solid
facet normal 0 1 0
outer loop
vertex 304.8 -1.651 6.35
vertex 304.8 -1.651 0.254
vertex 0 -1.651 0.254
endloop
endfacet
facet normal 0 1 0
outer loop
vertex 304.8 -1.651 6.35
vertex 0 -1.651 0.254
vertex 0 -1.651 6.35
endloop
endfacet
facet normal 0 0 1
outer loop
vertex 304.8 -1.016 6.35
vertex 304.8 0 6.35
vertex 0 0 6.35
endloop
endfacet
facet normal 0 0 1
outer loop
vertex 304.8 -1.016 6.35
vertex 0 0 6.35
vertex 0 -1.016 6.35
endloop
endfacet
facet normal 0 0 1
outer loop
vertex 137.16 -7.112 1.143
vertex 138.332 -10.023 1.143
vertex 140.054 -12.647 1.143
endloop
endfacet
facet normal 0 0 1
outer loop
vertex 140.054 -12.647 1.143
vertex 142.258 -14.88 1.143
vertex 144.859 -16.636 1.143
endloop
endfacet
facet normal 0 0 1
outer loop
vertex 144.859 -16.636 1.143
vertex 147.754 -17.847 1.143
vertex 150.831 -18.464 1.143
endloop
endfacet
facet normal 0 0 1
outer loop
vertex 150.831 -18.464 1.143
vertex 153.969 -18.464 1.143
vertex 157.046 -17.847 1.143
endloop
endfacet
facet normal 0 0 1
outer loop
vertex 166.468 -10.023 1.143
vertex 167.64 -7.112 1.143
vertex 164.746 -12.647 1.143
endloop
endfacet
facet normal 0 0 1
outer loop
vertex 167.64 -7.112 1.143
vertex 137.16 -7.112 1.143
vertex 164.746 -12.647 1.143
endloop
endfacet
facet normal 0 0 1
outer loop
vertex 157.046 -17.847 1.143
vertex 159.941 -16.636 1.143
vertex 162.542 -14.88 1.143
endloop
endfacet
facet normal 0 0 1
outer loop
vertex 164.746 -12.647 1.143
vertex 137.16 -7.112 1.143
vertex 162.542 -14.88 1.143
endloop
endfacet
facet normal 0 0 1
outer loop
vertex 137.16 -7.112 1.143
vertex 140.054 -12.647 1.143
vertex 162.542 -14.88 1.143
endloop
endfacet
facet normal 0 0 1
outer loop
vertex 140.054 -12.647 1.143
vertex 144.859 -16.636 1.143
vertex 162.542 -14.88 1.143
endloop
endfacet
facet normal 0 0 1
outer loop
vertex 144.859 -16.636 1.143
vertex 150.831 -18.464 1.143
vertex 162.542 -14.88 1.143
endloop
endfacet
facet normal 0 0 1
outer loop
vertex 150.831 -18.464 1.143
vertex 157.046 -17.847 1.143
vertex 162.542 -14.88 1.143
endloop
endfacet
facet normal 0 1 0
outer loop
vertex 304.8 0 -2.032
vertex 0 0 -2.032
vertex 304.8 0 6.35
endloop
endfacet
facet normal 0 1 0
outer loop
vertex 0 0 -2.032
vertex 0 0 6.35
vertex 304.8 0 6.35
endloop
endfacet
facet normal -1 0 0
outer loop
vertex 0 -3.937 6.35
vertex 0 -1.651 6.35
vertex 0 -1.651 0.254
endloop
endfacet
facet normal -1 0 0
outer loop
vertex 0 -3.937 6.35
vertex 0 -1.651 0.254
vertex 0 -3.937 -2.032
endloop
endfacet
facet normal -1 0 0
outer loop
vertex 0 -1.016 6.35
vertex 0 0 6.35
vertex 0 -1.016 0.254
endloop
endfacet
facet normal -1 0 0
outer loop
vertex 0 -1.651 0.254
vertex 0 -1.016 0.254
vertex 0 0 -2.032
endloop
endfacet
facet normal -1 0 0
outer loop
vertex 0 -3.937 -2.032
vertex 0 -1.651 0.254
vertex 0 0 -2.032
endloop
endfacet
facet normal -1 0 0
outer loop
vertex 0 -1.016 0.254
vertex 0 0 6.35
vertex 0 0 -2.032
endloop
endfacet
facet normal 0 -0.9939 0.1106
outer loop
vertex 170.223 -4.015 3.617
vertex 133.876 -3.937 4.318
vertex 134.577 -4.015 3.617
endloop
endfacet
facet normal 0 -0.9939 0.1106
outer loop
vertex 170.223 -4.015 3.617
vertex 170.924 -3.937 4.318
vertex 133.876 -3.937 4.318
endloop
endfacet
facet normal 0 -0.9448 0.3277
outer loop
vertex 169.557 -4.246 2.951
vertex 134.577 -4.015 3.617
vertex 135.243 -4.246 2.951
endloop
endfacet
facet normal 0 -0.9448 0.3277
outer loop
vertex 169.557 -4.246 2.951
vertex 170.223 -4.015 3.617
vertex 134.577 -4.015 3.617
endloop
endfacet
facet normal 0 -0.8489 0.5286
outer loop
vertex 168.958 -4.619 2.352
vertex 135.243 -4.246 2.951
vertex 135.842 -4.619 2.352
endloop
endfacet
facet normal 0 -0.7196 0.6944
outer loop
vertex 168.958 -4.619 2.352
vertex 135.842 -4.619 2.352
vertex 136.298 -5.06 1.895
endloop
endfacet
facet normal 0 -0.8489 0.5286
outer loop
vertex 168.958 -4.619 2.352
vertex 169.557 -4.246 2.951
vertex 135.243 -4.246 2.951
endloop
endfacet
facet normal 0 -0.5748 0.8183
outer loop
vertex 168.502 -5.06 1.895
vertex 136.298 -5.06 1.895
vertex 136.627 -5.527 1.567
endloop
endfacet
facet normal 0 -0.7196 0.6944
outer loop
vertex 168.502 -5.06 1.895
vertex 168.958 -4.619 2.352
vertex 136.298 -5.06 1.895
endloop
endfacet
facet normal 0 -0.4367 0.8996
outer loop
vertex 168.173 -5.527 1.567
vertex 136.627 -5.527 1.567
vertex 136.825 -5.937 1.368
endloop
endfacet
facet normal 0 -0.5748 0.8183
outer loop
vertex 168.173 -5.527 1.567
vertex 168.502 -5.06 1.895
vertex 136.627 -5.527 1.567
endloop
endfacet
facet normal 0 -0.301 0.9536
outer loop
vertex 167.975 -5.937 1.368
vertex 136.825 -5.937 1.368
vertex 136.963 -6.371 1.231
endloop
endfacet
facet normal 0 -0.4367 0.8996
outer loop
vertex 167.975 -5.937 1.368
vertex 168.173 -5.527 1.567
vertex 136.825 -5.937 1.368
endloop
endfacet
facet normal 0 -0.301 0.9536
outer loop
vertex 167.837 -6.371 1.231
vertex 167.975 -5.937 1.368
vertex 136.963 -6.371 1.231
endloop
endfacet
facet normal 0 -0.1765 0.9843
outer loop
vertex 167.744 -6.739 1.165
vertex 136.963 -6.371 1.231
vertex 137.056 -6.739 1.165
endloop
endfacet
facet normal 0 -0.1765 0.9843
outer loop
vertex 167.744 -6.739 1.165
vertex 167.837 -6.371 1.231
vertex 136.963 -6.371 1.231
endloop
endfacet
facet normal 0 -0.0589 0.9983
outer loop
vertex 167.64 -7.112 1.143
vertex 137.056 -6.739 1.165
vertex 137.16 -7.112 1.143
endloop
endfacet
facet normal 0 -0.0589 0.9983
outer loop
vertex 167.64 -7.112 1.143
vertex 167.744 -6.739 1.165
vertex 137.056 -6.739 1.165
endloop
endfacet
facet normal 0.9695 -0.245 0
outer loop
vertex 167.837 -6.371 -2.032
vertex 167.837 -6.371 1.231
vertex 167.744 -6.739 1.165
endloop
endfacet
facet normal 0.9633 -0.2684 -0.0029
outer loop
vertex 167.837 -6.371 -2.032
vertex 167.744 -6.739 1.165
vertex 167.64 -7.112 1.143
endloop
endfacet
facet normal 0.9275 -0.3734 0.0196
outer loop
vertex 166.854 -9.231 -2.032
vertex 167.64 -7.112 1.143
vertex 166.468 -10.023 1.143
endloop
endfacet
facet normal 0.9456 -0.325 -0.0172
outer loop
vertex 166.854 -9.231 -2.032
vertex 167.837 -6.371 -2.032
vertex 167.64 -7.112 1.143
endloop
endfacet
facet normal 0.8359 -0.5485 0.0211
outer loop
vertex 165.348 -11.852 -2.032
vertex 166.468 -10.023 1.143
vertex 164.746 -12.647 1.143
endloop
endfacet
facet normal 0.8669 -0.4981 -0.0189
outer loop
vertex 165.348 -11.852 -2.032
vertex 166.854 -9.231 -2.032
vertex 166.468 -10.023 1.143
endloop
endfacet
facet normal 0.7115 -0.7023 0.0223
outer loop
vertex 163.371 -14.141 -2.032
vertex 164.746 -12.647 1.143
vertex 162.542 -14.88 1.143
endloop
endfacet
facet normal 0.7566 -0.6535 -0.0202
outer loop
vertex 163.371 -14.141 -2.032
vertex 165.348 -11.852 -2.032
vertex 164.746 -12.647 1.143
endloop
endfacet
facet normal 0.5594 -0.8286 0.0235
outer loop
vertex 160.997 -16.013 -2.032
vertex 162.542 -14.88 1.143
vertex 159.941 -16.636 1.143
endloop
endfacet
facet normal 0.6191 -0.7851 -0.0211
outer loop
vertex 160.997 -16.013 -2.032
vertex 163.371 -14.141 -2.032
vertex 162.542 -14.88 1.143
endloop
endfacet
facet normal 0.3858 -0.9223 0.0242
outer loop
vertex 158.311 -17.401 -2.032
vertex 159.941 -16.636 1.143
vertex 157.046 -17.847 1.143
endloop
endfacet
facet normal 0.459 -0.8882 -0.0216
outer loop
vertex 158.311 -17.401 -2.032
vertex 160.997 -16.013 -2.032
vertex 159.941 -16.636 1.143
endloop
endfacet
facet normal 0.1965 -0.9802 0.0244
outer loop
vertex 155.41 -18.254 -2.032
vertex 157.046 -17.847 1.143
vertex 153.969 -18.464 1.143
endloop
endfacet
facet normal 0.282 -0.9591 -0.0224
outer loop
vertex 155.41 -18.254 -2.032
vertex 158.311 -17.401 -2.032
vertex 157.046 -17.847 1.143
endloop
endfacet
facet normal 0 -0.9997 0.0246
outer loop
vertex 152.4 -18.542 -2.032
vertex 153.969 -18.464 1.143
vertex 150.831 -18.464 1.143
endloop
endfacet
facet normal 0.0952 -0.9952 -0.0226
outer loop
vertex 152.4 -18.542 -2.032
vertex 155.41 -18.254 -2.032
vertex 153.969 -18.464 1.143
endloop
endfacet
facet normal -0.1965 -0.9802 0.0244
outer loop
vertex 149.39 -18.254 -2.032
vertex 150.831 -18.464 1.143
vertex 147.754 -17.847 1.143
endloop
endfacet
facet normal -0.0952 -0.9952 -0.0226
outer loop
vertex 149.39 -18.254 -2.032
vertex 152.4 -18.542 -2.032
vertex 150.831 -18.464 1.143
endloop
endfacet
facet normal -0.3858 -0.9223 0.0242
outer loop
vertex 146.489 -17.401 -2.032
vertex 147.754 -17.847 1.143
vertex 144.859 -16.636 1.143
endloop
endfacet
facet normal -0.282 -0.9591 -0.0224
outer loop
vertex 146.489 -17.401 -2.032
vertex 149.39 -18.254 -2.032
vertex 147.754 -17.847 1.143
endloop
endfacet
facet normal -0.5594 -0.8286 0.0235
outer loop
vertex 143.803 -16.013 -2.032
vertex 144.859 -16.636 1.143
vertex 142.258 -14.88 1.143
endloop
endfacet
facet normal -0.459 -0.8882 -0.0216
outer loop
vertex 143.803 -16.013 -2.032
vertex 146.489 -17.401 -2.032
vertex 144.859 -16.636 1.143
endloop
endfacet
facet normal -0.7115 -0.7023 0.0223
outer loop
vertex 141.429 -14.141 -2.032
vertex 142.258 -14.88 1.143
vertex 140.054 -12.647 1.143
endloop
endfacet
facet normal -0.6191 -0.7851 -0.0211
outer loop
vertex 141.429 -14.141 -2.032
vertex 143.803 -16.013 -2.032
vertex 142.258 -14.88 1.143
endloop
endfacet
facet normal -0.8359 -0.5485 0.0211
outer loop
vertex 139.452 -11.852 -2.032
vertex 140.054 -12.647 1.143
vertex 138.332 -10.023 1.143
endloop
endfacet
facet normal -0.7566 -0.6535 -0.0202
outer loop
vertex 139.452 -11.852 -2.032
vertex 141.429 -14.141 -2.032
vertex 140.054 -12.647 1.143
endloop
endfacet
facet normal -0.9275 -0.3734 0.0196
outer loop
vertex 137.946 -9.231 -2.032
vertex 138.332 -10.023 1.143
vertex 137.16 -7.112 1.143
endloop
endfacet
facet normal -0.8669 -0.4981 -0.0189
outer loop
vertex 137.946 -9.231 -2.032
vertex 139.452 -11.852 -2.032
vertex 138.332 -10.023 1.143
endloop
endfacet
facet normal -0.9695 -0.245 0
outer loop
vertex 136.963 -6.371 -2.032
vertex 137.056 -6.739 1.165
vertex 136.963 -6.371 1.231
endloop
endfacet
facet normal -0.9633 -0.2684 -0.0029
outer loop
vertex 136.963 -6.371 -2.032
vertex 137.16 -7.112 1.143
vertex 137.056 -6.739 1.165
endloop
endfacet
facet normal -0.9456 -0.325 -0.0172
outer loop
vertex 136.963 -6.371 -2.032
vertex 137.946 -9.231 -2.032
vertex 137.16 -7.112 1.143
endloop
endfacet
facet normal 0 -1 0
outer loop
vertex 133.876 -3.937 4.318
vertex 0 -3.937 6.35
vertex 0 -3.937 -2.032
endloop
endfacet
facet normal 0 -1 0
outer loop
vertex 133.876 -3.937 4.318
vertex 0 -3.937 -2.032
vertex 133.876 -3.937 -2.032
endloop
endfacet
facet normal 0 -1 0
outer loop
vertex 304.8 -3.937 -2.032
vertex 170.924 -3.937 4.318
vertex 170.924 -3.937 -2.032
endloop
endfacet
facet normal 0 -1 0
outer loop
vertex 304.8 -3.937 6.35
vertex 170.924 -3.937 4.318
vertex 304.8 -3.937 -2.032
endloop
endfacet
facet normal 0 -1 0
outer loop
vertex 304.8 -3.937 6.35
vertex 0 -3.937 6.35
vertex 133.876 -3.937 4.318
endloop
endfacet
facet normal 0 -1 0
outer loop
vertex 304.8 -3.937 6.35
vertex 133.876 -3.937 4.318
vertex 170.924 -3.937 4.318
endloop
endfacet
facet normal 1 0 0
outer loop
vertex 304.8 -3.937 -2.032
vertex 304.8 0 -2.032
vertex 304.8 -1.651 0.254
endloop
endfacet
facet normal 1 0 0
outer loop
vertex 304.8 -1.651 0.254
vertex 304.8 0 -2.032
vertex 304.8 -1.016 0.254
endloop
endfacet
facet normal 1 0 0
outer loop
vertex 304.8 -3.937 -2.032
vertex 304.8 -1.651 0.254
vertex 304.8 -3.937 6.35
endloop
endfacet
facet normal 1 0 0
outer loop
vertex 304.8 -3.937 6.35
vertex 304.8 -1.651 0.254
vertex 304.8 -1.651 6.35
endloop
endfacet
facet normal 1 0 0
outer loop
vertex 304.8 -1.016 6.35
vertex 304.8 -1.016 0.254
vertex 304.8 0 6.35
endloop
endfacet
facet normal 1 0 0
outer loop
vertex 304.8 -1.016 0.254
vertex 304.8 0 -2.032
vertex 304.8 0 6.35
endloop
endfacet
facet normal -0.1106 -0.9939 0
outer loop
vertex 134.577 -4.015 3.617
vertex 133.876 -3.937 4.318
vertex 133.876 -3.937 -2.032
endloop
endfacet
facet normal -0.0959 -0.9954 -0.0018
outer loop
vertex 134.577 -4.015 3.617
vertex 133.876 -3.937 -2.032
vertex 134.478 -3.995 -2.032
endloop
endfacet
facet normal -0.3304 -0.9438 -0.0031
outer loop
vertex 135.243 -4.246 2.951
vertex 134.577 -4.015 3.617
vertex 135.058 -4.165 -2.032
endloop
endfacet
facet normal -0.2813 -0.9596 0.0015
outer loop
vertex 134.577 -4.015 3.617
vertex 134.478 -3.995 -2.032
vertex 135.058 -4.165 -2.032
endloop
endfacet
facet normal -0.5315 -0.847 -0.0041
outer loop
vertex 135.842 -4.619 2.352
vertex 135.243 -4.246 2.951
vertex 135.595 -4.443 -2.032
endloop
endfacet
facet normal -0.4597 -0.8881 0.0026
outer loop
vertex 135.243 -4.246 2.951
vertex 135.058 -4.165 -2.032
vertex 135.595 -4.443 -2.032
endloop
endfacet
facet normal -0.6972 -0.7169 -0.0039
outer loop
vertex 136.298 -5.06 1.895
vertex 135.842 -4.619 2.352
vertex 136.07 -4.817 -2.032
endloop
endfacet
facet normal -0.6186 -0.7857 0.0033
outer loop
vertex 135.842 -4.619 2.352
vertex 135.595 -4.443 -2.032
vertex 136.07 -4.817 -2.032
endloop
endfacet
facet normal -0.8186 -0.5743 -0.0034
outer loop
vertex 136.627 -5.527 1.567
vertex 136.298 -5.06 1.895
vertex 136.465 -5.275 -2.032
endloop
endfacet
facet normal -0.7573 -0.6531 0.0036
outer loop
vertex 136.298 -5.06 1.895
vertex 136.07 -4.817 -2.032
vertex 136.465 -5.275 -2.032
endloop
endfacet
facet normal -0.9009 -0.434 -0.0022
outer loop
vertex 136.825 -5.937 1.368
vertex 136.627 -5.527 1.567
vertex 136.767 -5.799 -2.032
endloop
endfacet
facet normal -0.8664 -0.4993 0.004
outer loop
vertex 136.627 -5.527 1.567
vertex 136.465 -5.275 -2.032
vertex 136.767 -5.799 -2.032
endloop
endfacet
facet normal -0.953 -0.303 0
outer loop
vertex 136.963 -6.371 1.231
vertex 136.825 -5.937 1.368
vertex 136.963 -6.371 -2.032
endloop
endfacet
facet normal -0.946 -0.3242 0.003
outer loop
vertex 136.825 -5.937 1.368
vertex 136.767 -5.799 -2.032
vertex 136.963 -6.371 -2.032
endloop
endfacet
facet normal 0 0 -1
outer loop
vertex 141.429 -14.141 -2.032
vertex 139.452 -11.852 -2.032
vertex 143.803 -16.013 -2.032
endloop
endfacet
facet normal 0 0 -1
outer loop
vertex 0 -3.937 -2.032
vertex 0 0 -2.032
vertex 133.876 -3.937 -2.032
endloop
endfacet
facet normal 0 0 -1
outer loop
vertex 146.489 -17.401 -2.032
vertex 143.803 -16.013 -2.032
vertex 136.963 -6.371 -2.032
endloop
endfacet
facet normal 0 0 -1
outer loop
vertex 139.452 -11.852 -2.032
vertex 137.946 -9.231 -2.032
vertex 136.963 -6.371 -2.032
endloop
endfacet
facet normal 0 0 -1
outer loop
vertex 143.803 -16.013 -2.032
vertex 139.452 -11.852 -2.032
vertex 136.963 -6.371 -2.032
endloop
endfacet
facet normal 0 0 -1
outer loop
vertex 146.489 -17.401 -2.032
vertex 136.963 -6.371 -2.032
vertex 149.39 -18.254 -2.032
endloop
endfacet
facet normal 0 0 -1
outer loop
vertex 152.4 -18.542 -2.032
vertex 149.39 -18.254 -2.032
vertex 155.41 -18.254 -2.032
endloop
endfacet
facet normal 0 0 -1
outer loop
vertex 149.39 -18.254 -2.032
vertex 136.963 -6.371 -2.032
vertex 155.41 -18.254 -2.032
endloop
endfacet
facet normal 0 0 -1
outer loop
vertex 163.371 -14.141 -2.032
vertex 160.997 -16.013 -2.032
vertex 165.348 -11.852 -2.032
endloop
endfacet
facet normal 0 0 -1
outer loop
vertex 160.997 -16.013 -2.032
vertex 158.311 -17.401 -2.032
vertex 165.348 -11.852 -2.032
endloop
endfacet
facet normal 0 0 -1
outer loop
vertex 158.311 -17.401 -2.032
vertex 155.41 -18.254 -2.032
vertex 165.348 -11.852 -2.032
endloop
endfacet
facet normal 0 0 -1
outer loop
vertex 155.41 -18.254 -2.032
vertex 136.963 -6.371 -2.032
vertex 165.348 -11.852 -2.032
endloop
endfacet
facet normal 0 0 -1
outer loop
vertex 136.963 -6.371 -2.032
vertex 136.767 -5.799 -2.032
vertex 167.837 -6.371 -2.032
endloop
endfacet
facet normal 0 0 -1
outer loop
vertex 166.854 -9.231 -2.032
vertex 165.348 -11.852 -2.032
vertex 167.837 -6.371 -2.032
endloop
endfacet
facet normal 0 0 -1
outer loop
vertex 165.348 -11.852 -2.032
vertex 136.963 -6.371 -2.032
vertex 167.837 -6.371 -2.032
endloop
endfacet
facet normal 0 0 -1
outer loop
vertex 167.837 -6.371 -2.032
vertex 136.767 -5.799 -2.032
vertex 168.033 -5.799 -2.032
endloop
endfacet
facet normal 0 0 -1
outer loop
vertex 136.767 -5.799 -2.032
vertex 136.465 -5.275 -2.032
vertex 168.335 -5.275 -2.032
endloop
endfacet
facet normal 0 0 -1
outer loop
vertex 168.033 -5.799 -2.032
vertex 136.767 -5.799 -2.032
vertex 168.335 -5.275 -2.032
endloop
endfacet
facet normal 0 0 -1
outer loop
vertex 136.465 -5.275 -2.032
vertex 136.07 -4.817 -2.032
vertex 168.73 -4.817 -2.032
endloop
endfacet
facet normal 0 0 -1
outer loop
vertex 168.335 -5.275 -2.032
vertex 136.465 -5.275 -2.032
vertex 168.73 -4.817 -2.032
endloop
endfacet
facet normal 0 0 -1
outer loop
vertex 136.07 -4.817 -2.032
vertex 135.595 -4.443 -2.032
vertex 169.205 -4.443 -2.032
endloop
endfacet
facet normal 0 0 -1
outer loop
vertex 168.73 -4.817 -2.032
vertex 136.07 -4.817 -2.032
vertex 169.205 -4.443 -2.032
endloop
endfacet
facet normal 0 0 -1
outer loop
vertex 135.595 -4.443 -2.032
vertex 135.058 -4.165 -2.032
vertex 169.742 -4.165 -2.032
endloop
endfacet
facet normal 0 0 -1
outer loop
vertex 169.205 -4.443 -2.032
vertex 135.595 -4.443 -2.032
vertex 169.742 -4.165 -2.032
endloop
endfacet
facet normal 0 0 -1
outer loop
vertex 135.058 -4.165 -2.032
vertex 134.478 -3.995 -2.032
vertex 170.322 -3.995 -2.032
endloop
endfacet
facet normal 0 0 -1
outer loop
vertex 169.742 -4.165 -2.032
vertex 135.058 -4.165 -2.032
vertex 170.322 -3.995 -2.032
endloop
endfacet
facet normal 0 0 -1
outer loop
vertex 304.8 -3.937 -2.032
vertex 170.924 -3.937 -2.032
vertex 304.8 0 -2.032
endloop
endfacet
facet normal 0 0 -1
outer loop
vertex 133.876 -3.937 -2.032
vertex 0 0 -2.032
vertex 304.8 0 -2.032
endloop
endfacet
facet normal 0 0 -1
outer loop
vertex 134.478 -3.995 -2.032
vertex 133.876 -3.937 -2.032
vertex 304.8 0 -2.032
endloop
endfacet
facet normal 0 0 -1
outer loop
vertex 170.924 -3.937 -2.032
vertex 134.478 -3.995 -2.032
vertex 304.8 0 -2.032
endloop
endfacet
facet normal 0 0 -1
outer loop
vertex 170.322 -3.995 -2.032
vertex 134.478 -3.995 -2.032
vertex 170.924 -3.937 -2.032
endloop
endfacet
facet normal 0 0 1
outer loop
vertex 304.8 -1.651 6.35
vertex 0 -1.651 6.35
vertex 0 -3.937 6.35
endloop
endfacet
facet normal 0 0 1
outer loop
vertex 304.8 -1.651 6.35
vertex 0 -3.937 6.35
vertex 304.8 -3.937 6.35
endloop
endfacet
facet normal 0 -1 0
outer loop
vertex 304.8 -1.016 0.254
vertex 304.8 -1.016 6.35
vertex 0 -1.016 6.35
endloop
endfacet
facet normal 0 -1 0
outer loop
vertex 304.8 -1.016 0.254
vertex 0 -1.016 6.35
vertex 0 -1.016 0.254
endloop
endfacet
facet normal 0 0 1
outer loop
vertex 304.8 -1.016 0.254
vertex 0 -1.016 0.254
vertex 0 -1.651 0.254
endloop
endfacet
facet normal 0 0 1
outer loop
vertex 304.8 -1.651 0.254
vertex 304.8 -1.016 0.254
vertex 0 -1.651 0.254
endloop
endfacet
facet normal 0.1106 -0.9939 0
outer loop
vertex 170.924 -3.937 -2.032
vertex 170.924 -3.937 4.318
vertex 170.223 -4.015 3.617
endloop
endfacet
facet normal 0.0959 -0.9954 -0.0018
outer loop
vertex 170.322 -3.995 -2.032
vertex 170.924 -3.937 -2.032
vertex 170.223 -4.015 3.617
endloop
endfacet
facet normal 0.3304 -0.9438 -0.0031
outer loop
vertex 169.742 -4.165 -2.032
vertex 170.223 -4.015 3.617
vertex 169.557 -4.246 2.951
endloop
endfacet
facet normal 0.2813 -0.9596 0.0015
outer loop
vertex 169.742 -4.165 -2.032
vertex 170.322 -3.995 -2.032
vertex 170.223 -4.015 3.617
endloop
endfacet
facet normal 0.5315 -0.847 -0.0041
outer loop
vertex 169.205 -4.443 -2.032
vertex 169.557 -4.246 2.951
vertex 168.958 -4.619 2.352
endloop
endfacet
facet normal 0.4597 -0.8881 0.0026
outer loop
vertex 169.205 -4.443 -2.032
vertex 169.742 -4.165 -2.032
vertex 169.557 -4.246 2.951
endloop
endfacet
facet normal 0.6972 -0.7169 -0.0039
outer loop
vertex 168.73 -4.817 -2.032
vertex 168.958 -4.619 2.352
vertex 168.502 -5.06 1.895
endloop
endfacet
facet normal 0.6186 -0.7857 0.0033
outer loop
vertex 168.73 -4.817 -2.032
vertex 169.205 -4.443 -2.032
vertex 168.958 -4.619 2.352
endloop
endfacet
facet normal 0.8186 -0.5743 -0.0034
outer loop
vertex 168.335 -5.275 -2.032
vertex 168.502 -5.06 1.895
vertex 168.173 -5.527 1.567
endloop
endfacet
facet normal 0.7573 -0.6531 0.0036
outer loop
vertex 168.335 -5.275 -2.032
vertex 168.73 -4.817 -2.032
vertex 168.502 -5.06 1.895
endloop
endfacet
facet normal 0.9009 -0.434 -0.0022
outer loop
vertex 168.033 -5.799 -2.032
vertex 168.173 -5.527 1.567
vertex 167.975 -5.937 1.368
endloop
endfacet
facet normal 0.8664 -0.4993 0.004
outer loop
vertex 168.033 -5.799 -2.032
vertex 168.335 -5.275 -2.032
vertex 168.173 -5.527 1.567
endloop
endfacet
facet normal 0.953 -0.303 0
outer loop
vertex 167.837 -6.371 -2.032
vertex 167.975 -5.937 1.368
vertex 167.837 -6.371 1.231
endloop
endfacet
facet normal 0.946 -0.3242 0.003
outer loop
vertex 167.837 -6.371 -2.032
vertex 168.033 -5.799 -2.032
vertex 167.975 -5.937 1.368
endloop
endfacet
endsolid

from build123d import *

# Parameters (mm, degrees)
F1_DEPTH = 304.8
F2_DEPTH = 2.032
F4_DEPTH = 1.27
F5_DEPTH = 3.175
F6_R     = 3.175


with BuildPart() as f1:
    # F0 (on Right) → F1 (new body)
    with BuildSketch(Plane.YZ):
        Polygon((-2.667, 0), (0, 0), (0, 6.35), (-1.016, 6.35), (-1.016, 0.254), (-1.651, 0.254), (-1.651, 6.35), (-2.667, 6.35), align=None)
    extrude(amount=F1_DEPTH)

    # F2 (add): a face of the model
    f2_faces = [f1.faces().sort_by_distance(p)[0] for p in [
        (152.4, -1.3335, 0),
    ]]
    extrude(f2_faces, amount=F2_DEPTH)

    # F4 (add): a face of the model
    f4_faces = [f1.faces().sort_by_distance(p)[0] for p in [
        (152.4, -2.667, 2.159),
    ]]
    extrude(f4_faces, amount=F4_DEPTH)

    # F3 (on face) → F5 (join)
    with BuildSketch(Plane(origin=(0, 0, -2.032), x_dir=(1, 0, 0), z_dir=(0, 0, -1))):
        with BuildLine():
            Line((136.525, 2.667), (168.275, 2.667))
            ThreePointArc((168.275, 2.667), (152.4, 18.542), (136.525, 2.667))
        make_face()
    extrude(amount=-F5_DEPTH)

    # F6
    f6_edges = [f1.edges().sort_by_distance(p)[0] for p in [
        (152.4, -3.937, 1.143),
        (136.575882, -3.937, -0.4445),
        (168.224118, -3.937, -0.4445),
    ]]
    fillet(f6_edges, radius=F6_R)


solid = f1.part
